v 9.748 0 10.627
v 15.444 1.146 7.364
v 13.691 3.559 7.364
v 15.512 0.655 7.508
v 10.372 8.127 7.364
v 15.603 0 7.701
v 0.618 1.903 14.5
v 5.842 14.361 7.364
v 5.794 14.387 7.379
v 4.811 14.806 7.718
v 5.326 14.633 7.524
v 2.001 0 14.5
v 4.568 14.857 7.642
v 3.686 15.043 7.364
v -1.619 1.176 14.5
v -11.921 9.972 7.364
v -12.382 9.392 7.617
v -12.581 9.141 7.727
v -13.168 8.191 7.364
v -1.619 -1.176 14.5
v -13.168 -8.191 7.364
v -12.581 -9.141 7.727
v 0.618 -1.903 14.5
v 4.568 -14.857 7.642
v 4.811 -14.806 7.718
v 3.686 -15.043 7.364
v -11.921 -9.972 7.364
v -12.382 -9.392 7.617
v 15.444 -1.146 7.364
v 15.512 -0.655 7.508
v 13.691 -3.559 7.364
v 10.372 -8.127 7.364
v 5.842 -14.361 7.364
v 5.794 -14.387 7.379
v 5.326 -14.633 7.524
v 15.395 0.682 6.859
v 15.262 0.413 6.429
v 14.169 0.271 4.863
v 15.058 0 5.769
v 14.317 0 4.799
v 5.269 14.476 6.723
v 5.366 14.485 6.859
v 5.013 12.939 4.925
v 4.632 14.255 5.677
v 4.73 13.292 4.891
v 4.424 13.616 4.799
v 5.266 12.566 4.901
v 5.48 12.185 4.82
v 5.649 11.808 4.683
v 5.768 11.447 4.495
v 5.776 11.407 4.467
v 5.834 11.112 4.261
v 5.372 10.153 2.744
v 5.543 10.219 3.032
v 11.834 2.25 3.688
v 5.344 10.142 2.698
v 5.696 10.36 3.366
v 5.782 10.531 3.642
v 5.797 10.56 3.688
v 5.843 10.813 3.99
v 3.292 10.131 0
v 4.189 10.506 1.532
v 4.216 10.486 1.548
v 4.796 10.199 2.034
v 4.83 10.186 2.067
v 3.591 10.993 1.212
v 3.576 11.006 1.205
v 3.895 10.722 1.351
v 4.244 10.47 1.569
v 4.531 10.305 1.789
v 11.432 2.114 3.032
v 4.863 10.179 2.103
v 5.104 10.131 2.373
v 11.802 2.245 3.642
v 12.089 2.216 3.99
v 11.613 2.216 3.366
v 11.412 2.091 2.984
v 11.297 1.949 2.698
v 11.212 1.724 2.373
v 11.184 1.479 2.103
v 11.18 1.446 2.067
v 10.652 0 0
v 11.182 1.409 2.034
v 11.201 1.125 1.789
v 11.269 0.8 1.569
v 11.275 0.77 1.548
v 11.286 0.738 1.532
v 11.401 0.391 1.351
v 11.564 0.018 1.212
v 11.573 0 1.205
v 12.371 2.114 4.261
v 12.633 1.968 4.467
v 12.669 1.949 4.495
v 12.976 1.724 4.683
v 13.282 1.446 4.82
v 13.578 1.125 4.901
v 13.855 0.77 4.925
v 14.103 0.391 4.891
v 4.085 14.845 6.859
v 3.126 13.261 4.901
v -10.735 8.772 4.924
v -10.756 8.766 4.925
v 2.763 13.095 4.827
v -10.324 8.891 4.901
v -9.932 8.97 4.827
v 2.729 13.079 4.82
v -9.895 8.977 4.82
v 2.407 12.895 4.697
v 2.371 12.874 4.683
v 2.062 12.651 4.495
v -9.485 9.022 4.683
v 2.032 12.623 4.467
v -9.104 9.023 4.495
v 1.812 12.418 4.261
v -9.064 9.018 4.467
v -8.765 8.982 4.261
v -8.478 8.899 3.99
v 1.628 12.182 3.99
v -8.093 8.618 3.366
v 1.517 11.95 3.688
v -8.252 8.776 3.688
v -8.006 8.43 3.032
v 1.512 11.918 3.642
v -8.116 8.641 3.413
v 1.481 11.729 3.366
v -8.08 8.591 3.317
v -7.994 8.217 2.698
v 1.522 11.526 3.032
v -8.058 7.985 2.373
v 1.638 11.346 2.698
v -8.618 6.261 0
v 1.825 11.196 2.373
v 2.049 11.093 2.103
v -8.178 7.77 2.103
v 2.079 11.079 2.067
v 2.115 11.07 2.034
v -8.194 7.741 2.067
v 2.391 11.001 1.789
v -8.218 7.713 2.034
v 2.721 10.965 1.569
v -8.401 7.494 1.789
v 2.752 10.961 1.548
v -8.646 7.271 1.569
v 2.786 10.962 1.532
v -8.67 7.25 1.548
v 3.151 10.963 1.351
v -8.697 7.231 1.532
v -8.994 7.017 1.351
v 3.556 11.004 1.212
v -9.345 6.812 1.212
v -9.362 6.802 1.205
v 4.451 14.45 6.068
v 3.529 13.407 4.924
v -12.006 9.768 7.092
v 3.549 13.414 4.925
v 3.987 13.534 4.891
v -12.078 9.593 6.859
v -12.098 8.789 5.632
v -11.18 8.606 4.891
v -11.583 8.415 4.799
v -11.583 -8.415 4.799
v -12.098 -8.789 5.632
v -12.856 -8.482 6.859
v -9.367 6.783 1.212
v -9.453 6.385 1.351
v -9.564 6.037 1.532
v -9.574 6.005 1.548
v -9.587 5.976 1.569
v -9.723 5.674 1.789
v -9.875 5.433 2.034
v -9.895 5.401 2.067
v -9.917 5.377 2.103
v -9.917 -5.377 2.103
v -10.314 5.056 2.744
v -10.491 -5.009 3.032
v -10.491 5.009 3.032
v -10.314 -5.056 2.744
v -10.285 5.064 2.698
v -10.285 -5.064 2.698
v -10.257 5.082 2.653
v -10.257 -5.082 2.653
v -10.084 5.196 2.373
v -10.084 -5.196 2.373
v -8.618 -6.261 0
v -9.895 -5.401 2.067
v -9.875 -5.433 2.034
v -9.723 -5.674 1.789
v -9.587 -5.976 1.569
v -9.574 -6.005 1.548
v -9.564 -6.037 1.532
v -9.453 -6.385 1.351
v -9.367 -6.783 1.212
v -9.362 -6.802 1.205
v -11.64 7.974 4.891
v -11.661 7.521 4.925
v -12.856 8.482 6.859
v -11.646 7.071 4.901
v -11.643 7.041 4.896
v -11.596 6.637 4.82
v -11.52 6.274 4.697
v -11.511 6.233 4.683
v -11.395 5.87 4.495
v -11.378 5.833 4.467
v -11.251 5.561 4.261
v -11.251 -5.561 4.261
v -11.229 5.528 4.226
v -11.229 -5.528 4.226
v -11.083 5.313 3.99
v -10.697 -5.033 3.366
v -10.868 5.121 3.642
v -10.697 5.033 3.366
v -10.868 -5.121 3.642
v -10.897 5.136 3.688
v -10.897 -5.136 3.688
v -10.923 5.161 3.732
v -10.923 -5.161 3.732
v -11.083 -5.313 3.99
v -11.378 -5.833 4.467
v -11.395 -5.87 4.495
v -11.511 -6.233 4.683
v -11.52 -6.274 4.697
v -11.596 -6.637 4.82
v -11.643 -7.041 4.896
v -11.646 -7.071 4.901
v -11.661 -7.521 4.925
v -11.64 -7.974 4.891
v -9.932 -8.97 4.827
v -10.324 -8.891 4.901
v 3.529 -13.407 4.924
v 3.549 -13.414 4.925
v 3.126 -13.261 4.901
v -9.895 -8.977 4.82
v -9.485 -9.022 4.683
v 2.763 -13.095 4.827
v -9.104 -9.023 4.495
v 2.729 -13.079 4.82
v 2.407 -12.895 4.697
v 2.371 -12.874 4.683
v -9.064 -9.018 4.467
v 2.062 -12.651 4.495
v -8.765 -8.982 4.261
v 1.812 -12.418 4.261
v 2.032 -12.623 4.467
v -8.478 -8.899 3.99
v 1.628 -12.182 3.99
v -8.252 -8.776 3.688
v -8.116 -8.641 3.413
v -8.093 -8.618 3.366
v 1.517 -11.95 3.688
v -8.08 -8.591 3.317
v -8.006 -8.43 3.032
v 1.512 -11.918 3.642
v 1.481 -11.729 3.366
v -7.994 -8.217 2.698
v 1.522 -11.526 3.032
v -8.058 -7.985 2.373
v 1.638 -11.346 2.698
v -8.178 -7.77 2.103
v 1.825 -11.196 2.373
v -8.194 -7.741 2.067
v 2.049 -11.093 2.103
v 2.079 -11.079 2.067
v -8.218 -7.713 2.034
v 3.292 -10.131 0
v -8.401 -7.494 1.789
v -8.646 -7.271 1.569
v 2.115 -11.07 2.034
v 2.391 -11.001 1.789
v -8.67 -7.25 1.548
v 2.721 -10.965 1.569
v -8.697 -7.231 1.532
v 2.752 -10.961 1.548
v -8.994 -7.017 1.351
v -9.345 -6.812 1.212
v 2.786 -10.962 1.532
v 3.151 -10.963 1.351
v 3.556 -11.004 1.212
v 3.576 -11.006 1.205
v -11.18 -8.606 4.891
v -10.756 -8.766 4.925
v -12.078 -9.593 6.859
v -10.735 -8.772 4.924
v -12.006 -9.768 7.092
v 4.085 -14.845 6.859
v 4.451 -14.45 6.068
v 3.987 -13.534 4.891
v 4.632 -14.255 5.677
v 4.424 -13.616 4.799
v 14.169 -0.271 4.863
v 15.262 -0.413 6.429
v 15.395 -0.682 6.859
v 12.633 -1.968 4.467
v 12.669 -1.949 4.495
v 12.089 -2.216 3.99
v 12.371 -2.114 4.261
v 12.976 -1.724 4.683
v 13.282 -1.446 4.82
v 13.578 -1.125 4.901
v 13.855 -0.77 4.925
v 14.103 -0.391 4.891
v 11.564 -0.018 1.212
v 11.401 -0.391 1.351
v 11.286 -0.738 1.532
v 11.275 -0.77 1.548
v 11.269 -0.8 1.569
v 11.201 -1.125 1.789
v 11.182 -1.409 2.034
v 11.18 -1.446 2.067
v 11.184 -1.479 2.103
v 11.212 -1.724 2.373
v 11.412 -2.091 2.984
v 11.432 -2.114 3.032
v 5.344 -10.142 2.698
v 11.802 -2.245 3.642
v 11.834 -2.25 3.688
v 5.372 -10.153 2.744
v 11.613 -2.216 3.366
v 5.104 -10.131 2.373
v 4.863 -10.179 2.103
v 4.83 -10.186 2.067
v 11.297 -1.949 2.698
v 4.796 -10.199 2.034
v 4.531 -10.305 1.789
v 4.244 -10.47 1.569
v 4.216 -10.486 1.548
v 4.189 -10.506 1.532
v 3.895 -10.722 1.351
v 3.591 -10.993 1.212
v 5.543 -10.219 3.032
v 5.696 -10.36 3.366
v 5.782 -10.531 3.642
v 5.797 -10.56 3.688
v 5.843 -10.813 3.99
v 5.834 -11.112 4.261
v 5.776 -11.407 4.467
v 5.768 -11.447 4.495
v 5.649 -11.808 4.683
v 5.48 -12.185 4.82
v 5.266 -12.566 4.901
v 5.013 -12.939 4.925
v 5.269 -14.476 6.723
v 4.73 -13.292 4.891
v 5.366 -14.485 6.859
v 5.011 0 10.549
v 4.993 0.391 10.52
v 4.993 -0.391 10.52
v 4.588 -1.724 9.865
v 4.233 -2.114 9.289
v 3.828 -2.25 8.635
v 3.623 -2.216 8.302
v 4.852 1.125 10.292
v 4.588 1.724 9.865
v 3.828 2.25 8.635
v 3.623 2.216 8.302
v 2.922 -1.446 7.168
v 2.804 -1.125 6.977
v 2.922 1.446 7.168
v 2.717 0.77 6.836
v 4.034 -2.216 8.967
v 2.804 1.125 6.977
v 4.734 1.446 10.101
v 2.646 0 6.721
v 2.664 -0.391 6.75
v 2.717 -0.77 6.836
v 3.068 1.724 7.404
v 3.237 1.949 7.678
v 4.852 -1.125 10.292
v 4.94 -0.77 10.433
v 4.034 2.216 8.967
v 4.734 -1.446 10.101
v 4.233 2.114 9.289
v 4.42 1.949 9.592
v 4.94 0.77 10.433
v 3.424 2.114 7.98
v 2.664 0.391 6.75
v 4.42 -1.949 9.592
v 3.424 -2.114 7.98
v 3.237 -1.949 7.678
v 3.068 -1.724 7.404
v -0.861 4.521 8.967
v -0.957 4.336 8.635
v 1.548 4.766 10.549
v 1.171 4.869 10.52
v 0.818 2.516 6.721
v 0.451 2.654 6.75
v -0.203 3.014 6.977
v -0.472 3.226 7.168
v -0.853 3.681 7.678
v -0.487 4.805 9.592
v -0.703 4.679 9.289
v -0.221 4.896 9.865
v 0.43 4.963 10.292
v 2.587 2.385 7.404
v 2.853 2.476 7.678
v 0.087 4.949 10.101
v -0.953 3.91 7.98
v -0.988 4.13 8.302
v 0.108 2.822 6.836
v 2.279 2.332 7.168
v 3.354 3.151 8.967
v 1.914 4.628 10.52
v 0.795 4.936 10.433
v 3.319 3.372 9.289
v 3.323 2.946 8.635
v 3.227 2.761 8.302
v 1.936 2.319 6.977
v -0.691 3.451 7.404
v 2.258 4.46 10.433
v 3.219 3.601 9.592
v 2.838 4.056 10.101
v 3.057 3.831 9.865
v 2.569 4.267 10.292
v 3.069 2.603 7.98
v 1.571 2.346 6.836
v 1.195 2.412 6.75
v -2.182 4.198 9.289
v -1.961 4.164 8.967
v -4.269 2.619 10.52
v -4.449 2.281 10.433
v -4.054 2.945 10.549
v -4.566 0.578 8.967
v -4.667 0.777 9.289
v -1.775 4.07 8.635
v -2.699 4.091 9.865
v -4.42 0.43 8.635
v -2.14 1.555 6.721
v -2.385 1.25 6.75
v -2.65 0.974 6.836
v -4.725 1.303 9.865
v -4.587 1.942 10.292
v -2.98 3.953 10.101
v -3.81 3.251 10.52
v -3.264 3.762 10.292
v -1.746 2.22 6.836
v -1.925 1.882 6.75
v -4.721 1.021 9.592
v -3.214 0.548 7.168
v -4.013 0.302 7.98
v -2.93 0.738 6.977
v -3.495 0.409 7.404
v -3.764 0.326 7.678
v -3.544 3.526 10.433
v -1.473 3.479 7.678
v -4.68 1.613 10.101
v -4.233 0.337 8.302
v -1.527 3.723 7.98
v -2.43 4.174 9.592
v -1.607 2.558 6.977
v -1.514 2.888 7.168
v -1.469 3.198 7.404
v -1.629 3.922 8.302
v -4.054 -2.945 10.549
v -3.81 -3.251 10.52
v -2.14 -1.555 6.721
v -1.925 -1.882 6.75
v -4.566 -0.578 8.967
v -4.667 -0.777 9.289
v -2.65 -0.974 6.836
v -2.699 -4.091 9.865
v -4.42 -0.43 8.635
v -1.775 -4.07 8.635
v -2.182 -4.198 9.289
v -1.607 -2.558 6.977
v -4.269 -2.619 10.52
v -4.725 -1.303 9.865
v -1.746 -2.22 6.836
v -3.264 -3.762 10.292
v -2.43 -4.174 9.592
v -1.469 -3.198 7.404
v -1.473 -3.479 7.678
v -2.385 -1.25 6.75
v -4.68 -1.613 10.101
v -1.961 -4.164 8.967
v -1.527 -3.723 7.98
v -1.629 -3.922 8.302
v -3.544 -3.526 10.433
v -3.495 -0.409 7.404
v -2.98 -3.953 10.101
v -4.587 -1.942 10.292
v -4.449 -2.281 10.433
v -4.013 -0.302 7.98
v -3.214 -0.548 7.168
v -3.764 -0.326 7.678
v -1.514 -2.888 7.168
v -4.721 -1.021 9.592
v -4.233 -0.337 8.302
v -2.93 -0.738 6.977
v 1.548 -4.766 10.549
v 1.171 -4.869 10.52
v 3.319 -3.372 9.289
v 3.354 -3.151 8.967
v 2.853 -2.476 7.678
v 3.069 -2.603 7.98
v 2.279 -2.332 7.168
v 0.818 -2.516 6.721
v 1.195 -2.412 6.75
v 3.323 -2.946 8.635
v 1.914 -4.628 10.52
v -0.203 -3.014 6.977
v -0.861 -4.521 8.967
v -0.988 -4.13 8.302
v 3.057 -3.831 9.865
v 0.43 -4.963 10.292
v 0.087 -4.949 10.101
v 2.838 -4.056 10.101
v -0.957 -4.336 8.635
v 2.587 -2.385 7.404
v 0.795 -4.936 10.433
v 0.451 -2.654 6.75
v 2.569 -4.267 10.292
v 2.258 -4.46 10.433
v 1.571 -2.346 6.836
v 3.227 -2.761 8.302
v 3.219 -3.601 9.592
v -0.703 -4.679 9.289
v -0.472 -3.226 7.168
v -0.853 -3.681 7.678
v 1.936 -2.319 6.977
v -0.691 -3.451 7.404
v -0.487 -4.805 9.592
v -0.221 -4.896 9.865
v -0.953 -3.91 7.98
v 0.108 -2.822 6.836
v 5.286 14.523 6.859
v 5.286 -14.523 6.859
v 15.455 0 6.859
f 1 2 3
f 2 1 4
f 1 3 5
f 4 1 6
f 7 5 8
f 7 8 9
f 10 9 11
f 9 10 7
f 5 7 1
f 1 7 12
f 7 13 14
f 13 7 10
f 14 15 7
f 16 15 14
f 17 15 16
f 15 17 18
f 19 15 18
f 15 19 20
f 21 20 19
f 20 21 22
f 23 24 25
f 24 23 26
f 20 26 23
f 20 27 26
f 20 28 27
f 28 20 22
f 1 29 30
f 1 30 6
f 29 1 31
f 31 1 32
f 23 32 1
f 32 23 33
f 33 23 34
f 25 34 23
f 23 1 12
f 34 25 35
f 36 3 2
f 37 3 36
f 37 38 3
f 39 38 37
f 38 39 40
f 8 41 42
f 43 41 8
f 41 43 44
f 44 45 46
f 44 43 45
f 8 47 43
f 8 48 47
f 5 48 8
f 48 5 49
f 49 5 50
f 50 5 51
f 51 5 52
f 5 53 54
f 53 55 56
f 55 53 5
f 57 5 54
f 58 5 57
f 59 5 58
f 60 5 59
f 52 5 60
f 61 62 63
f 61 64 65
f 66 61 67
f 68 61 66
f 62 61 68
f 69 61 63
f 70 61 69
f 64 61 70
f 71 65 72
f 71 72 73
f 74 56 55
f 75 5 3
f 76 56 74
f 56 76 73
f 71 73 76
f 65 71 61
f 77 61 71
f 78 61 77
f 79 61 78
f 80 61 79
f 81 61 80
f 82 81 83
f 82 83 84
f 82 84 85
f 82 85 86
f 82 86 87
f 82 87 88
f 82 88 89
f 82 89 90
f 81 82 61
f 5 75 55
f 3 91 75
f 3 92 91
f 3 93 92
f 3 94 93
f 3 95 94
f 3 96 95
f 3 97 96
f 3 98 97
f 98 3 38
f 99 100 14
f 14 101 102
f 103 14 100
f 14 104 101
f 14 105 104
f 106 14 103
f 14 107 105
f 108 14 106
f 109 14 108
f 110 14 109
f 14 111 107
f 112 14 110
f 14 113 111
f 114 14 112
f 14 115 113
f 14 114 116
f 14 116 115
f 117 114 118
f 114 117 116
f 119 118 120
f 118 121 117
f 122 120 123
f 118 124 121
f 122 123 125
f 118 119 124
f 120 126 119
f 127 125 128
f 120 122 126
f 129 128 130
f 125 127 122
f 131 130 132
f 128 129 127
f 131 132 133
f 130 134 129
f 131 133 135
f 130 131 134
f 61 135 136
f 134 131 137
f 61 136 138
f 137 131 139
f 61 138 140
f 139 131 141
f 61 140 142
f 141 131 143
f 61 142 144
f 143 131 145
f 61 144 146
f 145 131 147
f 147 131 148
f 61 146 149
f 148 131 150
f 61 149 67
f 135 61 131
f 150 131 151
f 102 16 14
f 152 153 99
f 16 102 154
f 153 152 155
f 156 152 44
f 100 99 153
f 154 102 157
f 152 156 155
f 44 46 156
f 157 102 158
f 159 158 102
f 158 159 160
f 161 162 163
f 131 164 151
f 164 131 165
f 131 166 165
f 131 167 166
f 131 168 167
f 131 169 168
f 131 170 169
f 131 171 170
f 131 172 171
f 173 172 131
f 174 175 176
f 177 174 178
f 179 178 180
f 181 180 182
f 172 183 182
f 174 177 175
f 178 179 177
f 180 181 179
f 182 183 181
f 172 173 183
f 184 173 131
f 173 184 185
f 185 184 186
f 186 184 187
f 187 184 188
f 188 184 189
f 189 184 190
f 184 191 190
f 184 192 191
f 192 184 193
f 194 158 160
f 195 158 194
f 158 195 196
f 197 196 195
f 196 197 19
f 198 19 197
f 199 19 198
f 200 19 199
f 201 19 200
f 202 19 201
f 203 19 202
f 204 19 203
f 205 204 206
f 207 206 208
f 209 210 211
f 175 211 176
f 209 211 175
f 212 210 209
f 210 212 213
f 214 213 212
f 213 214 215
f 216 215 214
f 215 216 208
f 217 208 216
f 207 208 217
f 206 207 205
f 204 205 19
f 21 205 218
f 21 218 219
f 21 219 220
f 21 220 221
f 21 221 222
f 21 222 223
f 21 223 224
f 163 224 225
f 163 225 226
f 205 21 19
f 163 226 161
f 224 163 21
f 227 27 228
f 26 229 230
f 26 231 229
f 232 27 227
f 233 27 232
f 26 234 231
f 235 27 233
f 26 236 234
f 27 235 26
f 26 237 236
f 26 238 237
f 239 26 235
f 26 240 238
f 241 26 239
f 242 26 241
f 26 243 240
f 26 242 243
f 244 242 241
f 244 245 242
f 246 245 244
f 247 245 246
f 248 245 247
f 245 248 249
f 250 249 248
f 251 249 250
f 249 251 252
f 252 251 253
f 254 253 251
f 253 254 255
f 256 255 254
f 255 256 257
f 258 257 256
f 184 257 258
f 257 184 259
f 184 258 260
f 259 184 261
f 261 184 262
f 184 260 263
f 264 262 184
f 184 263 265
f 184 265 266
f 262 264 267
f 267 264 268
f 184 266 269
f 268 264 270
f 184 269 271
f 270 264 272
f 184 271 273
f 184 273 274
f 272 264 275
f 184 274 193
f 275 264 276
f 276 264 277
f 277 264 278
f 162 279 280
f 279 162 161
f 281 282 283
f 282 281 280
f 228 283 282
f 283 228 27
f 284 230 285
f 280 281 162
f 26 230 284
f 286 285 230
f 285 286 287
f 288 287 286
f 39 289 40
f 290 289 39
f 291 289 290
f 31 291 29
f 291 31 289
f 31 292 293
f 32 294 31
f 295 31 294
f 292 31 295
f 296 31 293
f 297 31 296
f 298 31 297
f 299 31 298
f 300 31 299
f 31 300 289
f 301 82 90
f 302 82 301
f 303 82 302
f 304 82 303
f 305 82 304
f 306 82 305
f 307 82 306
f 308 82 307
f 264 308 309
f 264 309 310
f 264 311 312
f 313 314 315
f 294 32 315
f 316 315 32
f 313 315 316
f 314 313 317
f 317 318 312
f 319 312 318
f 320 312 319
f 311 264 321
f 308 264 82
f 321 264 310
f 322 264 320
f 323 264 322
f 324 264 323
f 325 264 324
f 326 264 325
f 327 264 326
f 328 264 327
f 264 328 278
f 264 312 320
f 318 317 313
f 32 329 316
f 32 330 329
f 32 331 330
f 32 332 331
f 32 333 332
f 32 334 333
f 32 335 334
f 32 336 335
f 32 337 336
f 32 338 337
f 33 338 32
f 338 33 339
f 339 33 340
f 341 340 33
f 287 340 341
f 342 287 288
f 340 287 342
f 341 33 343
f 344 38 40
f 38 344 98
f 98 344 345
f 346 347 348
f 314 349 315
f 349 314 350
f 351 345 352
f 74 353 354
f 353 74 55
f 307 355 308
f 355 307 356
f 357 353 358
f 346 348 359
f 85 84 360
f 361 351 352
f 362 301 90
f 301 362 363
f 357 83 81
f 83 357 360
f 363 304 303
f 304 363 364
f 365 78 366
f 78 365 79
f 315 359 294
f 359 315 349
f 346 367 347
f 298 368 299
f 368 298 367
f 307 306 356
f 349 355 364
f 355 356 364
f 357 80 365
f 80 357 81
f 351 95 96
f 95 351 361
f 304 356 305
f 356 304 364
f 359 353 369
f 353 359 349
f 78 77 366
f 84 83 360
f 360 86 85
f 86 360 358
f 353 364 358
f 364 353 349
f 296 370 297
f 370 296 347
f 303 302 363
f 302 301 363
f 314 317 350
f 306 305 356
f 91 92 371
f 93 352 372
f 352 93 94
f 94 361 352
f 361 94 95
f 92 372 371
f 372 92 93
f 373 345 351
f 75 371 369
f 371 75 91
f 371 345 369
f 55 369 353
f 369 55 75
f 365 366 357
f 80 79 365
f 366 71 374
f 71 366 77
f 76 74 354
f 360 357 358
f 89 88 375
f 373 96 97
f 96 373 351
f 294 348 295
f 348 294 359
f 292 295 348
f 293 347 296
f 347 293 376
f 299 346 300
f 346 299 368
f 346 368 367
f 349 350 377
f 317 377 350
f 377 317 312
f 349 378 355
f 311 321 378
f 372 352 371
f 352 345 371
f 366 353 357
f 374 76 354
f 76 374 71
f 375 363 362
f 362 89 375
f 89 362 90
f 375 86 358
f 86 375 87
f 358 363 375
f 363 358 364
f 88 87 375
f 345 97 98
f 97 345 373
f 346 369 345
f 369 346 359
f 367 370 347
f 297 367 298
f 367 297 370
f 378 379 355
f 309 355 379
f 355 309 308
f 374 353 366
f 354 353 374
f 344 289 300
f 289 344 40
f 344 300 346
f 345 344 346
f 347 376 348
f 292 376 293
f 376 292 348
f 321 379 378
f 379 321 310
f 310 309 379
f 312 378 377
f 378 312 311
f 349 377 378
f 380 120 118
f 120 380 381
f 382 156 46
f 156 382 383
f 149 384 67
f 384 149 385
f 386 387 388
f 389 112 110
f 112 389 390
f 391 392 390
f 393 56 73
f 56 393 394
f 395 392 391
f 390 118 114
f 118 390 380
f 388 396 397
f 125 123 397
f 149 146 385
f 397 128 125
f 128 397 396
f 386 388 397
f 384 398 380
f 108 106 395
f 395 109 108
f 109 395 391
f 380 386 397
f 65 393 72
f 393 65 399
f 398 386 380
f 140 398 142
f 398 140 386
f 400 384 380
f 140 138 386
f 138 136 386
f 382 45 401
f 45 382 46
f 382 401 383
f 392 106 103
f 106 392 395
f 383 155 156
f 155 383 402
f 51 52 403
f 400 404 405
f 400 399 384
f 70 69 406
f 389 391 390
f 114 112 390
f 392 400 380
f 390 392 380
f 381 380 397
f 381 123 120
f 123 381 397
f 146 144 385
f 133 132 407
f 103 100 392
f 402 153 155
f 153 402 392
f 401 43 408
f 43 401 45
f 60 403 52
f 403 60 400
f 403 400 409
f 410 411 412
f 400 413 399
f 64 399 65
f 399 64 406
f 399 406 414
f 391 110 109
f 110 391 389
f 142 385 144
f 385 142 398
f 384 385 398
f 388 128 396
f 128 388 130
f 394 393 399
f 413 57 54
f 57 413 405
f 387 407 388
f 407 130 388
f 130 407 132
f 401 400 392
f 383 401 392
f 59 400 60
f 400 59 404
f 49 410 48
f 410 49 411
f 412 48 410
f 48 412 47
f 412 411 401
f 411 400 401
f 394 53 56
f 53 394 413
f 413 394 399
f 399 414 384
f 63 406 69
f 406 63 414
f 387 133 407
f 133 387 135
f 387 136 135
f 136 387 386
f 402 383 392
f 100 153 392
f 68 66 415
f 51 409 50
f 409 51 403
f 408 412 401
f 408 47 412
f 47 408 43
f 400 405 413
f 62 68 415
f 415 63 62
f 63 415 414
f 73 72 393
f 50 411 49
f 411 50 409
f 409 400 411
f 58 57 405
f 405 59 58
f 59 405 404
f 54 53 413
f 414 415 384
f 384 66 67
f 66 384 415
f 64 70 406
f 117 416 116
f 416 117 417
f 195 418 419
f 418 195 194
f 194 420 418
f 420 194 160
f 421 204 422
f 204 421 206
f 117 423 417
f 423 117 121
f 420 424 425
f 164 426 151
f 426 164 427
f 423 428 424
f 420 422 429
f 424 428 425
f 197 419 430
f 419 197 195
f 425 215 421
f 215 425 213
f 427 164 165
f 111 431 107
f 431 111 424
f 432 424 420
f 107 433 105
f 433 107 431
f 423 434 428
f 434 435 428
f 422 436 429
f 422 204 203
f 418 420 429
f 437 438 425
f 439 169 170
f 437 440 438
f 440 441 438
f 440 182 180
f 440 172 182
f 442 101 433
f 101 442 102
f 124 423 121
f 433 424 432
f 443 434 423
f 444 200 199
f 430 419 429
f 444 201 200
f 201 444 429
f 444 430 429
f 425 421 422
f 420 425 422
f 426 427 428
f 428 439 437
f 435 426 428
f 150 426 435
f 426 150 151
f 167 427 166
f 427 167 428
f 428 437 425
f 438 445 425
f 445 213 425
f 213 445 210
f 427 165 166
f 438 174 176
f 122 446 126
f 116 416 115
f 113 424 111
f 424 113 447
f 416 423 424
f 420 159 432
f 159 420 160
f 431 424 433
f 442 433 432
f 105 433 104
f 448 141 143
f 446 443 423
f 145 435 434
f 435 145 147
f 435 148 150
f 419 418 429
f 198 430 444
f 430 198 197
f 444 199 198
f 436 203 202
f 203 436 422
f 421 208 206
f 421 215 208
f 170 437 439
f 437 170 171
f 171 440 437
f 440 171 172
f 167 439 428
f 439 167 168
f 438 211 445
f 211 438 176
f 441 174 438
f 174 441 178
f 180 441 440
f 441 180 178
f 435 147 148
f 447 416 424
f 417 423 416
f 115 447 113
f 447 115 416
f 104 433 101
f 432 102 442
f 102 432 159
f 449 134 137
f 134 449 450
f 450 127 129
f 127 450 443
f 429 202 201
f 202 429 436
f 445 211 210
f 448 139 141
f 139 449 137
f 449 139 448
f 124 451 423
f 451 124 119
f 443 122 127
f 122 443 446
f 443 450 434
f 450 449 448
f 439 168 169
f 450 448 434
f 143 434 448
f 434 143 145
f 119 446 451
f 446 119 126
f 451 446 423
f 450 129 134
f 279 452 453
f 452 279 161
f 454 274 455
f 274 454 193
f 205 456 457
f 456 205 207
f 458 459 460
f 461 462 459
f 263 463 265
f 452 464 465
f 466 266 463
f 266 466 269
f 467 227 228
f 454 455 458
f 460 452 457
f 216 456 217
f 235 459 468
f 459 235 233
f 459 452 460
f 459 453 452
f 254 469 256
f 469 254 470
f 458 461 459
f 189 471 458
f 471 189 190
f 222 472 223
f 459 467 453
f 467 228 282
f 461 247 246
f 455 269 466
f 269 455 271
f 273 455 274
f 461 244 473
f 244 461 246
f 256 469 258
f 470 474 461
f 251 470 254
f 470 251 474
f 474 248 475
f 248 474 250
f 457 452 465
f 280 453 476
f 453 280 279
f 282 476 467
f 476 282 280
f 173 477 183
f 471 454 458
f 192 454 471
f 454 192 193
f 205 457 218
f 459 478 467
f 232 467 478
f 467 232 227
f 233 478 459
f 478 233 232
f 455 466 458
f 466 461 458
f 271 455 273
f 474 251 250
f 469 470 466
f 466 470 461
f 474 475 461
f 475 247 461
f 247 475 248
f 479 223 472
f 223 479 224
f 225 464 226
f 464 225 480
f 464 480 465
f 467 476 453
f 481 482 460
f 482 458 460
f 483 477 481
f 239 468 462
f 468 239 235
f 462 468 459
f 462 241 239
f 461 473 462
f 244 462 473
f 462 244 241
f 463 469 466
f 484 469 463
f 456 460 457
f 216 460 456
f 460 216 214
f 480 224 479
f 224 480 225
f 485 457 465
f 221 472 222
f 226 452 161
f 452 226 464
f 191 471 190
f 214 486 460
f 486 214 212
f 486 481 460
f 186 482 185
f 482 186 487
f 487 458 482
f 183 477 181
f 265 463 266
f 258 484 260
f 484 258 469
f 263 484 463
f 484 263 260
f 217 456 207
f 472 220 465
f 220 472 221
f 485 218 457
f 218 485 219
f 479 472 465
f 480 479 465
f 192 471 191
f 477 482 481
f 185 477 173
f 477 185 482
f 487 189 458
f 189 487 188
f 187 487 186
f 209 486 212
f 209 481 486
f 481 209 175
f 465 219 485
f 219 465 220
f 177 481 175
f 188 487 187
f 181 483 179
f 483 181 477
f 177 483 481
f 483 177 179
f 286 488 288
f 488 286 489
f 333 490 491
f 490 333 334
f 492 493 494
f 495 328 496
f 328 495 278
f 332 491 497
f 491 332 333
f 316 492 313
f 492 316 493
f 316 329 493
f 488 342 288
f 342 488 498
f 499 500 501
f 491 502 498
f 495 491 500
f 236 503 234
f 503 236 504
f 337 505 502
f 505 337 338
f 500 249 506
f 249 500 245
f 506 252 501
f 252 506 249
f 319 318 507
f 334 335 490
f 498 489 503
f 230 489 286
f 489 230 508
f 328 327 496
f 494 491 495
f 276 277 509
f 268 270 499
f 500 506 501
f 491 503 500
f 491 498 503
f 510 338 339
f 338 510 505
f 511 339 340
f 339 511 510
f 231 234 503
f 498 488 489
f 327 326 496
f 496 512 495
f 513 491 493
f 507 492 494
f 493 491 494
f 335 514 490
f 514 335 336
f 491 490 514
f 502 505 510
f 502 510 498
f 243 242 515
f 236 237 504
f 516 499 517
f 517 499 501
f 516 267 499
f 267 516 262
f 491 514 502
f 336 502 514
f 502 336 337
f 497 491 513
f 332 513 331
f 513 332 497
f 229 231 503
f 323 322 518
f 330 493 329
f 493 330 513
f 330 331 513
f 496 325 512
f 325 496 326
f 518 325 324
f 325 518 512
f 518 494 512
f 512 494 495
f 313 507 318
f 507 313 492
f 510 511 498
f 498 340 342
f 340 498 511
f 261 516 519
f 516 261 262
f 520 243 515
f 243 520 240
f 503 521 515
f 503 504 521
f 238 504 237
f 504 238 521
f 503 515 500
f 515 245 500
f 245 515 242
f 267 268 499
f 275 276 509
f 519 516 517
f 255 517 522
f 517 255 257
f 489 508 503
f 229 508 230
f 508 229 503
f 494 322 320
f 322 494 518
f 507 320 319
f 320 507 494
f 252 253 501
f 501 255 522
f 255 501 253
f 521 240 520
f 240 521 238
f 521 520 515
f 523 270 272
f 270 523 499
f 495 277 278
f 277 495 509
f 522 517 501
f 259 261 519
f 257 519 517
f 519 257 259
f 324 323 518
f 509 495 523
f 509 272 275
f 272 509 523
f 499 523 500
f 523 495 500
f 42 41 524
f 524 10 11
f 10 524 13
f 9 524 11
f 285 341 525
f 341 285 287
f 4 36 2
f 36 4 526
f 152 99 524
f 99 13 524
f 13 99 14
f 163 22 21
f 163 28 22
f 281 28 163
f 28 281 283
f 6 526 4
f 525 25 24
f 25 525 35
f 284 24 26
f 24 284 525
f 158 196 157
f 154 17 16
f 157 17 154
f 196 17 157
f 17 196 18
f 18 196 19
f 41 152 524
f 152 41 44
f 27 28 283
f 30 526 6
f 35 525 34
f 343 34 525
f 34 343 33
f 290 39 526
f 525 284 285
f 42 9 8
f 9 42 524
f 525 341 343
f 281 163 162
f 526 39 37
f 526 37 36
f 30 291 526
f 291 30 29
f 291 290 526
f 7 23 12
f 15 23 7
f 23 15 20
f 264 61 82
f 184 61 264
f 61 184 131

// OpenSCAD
$fn=36;


hole_r = 2.25;


module holes()
{
	for (a = [0:4]) 
	{
		rotate([0,-(90-31.71),a*72]) translate([0,0,-15.5]) cylinder(11, hole_r, hole_r);
	}
}

c=30;

module icosahedron_connector(){

	difference()
	{
		sphere(16);
		
		// top cutaway
		for (a = [0:4])
		{
			rotate([0, 0, 36+(a*72)]) translate([0, -c/2, 4.5]) rotate([0,31.71,0]) cube(c);
		}
		translate([0,0,18.5]) cube(c, center=true);
	
		//side cutaway
		for (a = [0:4])
		{
			rotate([0, 0, 36+(a*72)]) translate([8, -c/2, -12]) rotate([0,31.71,0]) cube(c);
		}
		
		//bottom cutaway
		translate([0,0,-26]) cube(c, center=true);
	
		// holes
		holes();
	}
}

translate([0,0,11])
	icosahedron_connector();
